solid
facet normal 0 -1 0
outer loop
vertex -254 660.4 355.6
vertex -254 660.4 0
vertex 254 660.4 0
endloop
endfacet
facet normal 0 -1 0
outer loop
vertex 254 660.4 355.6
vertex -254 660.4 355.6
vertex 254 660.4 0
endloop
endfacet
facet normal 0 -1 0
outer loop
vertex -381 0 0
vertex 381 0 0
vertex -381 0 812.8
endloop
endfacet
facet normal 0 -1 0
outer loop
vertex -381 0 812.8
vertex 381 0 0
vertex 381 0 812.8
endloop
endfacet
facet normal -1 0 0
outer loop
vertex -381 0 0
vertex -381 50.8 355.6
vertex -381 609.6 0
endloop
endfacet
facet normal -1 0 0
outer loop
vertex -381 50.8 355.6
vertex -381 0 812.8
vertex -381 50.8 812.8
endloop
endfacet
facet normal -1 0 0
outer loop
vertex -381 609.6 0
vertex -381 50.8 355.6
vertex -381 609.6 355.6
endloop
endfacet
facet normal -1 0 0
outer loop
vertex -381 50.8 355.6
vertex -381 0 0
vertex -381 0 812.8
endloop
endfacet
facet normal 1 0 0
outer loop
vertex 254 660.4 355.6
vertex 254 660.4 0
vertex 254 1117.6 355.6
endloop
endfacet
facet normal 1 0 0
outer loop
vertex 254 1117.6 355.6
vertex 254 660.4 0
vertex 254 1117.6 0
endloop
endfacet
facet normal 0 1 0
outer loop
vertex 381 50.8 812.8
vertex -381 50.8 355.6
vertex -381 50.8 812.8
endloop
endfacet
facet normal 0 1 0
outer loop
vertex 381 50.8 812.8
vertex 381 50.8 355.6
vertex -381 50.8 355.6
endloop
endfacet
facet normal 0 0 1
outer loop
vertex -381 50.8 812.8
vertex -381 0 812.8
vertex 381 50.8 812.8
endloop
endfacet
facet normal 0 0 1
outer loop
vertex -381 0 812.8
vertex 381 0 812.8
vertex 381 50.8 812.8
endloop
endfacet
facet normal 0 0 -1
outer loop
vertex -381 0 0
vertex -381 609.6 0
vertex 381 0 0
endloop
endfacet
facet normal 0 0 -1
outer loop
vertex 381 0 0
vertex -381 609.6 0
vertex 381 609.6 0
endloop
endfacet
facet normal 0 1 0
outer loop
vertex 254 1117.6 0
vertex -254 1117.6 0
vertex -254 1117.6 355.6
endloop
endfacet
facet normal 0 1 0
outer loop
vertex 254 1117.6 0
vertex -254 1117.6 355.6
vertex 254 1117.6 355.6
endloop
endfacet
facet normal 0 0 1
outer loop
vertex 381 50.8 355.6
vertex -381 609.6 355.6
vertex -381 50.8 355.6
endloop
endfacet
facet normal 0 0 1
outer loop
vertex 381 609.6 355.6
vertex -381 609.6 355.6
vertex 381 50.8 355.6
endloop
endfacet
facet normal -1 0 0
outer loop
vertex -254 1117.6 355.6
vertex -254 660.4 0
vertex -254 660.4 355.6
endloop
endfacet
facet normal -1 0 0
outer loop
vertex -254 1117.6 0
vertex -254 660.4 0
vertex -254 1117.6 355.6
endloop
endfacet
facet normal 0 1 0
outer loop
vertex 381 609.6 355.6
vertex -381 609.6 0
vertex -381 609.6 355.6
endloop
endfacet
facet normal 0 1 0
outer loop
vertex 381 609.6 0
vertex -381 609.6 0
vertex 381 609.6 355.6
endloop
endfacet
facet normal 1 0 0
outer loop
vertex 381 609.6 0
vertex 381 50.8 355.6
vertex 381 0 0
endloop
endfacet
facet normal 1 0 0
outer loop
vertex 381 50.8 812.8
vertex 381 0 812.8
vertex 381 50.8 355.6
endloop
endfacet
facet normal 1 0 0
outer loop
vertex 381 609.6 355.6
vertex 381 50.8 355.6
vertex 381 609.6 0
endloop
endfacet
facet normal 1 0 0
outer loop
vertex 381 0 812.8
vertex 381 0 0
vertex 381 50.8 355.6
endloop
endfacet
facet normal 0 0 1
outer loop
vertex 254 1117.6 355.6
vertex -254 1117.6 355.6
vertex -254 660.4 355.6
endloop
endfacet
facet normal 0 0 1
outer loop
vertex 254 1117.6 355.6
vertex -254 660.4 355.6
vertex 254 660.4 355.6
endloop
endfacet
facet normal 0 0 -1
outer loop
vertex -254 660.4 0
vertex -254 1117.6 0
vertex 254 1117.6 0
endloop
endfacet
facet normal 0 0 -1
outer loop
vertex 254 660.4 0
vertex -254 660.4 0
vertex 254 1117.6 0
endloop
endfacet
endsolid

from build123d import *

# Parameters (mm, degrees)
F0_W          = 762
F0_H          = 609.6
F0_W_2        = 508
F0_H_2        = 457.2
F1_DEPTH      = 355.6
F2_W          = 50.8
F2_H          = 457.2
F3_DEPTH      = 381
F3_DEPTH_BACK = 381


with BuildPart() as f1:
    # F0 (on Top) → F1 (new body)
    with BuildSketch(Plane.XY):
        with Locations((0, 304.8)):
            Rectangle(F0_W, F0_H)
        with Locations((0, 889)):
            Rectangle(F0_W_2, F0_H_2)
    extrude(amount=F1_DEPTH)

    # F2 (on Right) → F3 (join, two sides)
    with BuildSketch(Plane.YZ) as f3_sk:
        with Locations((25.4, 584.2)):
            Rectangle(F2_W, F2_H)
    extrude(amount=F3_DEPTH)
    extrude(f3_sk.sketch, amount=-F3_DEPTH_BACK)


solid = f1.part
